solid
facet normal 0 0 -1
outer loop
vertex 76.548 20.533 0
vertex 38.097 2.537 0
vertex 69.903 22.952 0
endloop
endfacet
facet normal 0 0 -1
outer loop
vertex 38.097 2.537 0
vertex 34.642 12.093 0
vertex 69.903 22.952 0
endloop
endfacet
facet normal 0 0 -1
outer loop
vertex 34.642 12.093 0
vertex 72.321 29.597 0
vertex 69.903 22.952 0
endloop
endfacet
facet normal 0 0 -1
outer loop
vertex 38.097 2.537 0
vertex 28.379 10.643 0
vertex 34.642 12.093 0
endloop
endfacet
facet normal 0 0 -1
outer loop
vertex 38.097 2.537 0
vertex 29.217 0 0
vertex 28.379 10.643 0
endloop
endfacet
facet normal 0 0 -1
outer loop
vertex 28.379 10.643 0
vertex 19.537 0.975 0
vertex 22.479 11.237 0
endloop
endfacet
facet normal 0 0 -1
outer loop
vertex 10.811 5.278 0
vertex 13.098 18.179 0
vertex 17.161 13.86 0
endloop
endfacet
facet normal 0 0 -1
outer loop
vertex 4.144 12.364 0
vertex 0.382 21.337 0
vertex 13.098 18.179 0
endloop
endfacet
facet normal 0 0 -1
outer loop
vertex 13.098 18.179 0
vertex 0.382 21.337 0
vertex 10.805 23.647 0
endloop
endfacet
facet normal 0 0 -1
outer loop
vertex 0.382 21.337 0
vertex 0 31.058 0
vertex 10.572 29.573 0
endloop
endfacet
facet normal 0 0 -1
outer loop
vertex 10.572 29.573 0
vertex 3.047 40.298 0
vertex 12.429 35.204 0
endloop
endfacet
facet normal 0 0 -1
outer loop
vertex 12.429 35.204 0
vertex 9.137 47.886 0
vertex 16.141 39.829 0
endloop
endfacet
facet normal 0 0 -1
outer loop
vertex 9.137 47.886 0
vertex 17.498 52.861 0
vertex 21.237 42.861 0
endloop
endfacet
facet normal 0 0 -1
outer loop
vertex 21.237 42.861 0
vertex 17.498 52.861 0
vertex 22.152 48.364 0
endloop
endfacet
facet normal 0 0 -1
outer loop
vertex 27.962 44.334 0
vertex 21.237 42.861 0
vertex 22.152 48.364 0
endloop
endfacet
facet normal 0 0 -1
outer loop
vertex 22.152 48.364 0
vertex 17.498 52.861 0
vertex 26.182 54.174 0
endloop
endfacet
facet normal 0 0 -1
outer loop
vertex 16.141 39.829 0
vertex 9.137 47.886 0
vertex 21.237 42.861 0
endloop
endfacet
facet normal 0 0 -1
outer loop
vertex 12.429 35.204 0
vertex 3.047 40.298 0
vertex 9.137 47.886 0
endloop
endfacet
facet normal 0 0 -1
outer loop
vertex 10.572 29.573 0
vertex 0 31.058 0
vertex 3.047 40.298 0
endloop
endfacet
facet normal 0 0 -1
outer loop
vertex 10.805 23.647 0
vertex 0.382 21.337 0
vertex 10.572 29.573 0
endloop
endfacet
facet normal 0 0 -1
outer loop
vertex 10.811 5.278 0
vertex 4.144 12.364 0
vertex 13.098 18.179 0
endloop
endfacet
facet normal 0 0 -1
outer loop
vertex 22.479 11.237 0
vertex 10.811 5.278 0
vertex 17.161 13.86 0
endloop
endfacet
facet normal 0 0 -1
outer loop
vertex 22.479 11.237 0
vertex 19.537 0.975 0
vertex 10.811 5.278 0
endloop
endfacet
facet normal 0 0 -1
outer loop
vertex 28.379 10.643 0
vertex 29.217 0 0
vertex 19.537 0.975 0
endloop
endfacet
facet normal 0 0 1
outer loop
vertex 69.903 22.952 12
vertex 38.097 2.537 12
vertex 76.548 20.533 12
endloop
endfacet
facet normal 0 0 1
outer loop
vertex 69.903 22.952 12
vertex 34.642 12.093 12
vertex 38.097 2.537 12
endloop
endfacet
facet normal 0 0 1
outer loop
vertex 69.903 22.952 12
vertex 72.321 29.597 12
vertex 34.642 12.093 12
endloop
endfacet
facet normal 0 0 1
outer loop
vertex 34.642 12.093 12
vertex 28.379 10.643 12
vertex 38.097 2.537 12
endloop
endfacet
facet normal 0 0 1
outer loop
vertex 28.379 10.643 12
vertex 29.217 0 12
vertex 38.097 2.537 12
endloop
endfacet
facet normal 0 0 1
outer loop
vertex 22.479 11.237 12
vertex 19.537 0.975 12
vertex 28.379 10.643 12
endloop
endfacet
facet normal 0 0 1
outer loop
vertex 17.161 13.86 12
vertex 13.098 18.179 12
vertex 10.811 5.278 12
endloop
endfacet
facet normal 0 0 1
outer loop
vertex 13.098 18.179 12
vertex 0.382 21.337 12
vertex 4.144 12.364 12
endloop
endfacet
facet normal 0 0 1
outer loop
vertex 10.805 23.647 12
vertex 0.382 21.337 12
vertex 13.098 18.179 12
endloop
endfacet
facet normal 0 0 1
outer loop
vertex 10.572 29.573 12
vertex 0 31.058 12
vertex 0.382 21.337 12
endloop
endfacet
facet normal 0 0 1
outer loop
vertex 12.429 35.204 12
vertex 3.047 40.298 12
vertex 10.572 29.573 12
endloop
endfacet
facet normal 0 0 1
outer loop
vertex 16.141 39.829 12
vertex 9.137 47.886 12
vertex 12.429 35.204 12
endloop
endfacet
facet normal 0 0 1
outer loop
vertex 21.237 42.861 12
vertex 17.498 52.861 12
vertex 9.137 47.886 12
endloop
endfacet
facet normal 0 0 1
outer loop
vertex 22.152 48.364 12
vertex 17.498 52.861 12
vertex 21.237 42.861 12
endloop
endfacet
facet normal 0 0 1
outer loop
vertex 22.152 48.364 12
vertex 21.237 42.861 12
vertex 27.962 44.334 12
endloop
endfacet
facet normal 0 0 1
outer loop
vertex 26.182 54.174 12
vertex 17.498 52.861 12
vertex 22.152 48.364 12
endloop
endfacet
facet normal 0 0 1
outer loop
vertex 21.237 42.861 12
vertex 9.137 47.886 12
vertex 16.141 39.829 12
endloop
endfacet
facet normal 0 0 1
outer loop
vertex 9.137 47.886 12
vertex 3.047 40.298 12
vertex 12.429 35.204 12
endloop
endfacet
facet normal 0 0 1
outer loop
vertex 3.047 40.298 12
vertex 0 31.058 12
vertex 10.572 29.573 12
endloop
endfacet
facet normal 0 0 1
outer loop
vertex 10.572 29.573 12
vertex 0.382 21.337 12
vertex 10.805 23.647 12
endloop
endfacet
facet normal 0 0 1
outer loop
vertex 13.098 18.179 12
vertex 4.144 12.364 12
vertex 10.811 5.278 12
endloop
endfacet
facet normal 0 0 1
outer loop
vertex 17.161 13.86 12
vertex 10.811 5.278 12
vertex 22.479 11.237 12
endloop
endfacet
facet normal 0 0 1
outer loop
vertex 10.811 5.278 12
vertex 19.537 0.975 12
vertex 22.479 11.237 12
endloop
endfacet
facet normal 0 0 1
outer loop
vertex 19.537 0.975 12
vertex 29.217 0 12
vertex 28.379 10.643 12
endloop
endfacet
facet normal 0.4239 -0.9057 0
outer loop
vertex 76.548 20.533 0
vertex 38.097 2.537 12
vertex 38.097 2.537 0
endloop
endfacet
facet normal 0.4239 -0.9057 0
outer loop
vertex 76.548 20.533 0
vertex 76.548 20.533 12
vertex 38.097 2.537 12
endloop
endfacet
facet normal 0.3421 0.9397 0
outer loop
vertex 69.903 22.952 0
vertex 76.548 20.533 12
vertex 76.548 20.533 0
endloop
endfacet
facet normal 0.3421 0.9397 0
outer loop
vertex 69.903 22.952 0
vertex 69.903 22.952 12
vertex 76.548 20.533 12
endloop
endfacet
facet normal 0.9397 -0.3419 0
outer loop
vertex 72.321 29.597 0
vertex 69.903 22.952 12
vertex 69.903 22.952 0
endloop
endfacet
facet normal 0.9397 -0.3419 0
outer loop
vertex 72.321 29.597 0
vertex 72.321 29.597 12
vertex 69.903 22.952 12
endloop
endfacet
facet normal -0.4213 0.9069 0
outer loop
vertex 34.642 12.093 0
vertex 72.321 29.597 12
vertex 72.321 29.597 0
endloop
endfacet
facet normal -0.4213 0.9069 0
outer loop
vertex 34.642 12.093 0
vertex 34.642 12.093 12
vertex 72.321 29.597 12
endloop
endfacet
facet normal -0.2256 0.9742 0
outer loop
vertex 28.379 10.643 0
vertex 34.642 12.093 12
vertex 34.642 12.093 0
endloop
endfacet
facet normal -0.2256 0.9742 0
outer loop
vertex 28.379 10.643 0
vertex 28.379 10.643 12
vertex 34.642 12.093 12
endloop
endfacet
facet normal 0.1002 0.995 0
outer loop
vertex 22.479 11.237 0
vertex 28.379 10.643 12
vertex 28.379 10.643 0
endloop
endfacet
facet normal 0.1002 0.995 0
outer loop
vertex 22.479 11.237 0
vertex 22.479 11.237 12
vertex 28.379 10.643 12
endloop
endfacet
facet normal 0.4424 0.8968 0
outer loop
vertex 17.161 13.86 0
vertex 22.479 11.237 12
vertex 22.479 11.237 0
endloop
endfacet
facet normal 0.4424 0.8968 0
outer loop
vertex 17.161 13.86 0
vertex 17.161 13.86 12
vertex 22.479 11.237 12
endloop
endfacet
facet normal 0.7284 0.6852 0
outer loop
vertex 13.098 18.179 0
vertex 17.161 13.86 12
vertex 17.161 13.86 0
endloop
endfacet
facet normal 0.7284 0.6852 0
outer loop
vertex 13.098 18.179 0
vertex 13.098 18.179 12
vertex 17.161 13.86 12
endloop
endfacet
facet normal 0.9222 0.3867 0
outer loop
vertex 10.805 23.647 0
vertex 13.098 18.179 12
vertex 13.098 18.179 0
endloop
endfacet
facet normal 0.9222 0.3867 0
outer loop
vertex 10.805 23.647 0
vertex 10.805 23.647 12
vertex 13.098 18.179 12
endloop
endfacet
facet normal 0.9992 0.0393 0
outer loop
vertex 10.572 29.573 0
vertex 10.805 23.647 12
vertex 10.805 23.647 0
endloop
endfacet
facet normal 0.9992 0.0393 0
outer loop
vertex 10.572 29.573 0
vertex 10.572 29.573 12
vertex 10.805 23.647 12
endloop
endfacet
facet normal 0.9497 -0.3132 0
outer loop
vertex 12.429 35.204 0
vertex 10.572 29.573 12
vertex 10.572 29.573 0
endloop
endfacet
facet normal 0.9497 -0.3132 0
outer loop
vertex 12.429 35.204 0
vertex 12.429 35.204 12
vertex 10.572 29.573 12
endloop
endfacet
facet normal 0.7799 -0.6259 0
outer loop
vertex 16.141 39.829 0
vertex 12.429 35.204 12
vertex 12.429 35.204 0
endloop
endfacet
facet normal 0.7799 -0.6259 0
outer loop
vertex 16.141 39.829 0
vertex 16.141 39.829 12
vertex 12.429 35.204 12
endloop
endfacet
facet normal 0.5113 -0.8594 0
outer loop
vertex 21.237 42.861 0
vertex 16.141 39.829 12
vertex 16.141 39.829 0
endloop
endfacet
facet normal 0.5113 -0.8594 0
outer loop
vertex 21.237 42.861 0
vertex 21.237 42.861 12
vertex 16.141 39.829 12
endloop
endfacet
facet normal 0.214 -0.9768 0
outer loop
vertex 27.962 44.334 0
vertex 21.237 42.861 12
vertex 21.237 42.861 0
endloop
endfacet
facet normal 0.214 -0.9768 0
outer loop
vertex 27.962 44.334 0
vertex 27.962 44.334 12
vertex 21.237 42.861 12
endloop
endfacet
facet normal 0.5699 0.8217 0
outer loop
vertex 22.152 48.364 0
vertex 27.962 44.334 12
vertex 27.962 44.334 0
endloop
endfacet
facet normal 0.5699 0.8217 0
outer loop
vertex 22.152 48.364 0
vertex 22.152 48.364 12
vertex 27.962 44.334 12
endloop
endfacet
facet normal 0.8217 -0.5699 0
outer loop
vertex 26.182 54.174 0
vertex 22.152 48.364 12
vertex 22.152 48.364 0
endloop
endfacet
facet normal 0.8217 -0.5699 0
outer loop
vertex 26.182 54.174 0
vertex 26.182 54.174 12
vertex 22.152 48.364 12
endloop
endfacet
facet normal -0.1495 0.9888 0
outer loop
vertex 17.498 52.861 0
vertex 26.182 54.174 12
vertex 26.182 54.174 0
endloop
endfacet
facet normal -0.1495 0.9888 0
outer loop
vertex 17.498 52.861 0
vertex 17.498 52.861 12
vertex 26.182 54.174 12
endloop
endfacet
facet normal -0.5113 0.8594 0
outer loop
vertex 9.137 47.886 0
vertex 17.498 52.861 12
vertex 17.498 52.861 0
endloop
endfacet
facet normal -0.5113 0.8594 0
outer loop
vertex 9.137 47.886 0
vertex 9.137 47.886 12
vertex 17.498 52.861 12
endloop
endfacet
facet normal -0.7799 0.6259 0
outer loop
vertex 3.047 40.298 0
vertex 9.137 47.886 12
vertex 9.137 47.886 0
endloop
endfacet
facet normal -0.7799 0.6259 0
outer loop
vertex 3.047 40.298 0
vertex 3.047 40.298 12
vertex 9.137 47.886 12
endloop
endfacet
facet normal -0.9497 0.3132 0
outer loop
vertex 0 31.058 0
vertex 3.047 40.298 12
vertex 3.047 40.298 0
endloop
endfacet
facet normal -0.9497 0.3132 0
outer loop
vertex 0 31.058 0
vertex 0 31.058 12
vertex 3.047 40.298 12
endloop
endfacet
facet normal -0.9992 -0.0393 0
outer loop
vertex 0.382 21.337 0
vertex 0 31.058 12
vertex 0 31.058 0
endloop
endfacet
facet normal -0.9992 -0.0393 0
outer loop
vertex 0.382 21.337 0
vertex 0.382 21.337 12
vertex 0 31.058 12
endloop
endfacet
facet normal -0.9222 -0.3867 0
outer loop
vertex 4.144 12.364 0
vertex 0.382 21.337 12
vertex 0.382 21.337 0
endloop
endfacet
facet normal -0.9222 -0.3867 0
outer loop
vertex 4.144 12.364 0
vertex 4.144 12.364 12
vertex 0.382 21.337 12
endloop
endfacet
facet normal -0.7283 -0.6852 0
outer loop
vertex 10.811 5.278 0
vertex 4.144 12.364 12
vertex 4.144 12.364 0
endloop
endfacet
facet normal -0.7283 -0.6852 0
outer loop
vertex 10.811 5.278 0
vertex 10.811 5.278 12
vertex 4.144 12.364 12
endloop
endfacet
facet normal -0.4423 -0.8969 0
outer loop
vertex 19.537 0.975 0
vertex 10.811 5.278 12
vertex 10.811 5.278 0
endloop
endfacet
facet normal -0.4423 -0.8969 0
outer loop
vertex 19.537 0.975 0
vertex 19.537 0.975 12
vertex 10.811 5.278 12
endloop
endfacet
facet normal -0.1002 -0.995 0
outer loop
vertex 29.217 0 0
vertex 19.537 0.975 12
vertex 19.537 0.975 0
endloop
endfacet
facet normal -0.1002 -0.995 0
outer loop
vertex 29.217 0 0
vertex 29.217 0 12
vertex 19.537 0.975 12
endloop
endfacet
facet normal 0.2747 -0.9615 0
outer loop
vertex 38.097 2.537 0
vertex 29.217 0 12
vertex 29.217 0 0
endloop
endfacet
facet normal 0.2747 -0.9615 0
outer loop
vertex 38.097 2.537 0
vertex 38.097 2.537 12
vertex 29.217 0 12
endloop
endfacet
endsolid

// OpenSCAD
$fn = 32;

// ----------------------------------------------------------------------
// Hook plate: curl radius 22 mm over 205 degrees, 10 mm thick band
// ----------------------------------------------------------------------

// --- parameters (mm) ---
profile_height = 12;      // extrusion height
profile_points = 26;      // points of the closed outline

profile = [[22.152, 48.364], [26.182, 54.174], [17.498, 52.861], [9.137, 47.886], [3.047, 40.298], [0, 31.058], [0.382, 21.337], [4.144, 12.364], [10.811, 5.278], [19.537, 0.975], [29.217, 0], [38.097, 2.537], [76.548, 20.533], [69.903, 22.952], [72.321, 29.597], [34.642, 12.093], [28.379, 10.643], [22.479, 11.237], [17.161, 13.86], [13.098, 18.179], [10.805, 23.647], [10.572, 29.573], [12.429, 35.204], [16.141, 39.829], [21.237, 42.861], [27.962, 44.334]];  // single closed polygon, 26 points, counter clockwise

// --- the one profile operation ---
linear_extrude(height = profile_height) polygon(points = profile);
